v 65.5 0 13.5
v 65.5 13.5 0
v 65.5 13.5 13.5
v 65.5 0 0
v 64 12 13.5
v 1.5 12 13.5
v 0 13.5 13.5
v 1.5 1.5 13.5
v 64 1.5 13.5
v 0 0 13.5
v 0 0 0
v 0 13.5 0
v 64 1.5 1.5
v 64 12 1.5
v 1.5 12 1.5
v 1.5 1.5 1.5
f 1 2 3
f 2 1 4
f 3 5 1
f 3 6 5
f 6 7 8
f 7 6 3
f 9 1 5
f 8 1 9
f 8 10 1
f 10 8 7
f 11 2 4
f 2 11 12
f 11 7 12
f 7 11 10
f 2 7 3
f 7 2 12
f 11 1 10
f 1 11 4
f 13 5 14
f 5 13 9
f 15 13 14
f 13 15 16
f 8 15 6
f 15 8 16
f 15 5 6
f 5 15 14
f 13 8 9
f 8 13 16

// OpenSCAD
// 盲人取药机 - 单次药量小抽屉 (Pill Drawer)
// 实际测量尺寸：65.5 × 13.5 × 13.5 mm
// 滑动方向：沿 13.5mm 短边（Y 方向）从底板推出
// X 方向 65.5mm 落在底板凹槽中，Z 方向 13.5mm 为盒子高度

drawer_w = 65.5;        // 抽屉外宽 (X方向，落入底板凹槽的宽度)
drawer_l = 13.5;        // 抽屉外长 (Y方向，滑动推出方向)
drawer_h = 13.5;        // 抽屉高度 (Z方向)
wall_thickness = 1.5;   // 壁厚与底板厚度

// --- 抽屉生成模块 ---
module pill_drawer() {
    difference() {
        // 1. 生成外部基础方块
        cube([drawer_w, drawer_l, drawer_h], center=false);

        // 2. 内部挖空，形成无盖盒子的形状
        translate([wall_thickness, wall_thickness, wall_thickness])
            cube([
                drawer_w - (2 * wall_thickness),
                drawer_l - (2 * wall_thickness),
                drawer_h // 顶部直接贯穿，形成开口
            ], center=false);
    }
}

// 渲染抽屉
pill_drawer();
